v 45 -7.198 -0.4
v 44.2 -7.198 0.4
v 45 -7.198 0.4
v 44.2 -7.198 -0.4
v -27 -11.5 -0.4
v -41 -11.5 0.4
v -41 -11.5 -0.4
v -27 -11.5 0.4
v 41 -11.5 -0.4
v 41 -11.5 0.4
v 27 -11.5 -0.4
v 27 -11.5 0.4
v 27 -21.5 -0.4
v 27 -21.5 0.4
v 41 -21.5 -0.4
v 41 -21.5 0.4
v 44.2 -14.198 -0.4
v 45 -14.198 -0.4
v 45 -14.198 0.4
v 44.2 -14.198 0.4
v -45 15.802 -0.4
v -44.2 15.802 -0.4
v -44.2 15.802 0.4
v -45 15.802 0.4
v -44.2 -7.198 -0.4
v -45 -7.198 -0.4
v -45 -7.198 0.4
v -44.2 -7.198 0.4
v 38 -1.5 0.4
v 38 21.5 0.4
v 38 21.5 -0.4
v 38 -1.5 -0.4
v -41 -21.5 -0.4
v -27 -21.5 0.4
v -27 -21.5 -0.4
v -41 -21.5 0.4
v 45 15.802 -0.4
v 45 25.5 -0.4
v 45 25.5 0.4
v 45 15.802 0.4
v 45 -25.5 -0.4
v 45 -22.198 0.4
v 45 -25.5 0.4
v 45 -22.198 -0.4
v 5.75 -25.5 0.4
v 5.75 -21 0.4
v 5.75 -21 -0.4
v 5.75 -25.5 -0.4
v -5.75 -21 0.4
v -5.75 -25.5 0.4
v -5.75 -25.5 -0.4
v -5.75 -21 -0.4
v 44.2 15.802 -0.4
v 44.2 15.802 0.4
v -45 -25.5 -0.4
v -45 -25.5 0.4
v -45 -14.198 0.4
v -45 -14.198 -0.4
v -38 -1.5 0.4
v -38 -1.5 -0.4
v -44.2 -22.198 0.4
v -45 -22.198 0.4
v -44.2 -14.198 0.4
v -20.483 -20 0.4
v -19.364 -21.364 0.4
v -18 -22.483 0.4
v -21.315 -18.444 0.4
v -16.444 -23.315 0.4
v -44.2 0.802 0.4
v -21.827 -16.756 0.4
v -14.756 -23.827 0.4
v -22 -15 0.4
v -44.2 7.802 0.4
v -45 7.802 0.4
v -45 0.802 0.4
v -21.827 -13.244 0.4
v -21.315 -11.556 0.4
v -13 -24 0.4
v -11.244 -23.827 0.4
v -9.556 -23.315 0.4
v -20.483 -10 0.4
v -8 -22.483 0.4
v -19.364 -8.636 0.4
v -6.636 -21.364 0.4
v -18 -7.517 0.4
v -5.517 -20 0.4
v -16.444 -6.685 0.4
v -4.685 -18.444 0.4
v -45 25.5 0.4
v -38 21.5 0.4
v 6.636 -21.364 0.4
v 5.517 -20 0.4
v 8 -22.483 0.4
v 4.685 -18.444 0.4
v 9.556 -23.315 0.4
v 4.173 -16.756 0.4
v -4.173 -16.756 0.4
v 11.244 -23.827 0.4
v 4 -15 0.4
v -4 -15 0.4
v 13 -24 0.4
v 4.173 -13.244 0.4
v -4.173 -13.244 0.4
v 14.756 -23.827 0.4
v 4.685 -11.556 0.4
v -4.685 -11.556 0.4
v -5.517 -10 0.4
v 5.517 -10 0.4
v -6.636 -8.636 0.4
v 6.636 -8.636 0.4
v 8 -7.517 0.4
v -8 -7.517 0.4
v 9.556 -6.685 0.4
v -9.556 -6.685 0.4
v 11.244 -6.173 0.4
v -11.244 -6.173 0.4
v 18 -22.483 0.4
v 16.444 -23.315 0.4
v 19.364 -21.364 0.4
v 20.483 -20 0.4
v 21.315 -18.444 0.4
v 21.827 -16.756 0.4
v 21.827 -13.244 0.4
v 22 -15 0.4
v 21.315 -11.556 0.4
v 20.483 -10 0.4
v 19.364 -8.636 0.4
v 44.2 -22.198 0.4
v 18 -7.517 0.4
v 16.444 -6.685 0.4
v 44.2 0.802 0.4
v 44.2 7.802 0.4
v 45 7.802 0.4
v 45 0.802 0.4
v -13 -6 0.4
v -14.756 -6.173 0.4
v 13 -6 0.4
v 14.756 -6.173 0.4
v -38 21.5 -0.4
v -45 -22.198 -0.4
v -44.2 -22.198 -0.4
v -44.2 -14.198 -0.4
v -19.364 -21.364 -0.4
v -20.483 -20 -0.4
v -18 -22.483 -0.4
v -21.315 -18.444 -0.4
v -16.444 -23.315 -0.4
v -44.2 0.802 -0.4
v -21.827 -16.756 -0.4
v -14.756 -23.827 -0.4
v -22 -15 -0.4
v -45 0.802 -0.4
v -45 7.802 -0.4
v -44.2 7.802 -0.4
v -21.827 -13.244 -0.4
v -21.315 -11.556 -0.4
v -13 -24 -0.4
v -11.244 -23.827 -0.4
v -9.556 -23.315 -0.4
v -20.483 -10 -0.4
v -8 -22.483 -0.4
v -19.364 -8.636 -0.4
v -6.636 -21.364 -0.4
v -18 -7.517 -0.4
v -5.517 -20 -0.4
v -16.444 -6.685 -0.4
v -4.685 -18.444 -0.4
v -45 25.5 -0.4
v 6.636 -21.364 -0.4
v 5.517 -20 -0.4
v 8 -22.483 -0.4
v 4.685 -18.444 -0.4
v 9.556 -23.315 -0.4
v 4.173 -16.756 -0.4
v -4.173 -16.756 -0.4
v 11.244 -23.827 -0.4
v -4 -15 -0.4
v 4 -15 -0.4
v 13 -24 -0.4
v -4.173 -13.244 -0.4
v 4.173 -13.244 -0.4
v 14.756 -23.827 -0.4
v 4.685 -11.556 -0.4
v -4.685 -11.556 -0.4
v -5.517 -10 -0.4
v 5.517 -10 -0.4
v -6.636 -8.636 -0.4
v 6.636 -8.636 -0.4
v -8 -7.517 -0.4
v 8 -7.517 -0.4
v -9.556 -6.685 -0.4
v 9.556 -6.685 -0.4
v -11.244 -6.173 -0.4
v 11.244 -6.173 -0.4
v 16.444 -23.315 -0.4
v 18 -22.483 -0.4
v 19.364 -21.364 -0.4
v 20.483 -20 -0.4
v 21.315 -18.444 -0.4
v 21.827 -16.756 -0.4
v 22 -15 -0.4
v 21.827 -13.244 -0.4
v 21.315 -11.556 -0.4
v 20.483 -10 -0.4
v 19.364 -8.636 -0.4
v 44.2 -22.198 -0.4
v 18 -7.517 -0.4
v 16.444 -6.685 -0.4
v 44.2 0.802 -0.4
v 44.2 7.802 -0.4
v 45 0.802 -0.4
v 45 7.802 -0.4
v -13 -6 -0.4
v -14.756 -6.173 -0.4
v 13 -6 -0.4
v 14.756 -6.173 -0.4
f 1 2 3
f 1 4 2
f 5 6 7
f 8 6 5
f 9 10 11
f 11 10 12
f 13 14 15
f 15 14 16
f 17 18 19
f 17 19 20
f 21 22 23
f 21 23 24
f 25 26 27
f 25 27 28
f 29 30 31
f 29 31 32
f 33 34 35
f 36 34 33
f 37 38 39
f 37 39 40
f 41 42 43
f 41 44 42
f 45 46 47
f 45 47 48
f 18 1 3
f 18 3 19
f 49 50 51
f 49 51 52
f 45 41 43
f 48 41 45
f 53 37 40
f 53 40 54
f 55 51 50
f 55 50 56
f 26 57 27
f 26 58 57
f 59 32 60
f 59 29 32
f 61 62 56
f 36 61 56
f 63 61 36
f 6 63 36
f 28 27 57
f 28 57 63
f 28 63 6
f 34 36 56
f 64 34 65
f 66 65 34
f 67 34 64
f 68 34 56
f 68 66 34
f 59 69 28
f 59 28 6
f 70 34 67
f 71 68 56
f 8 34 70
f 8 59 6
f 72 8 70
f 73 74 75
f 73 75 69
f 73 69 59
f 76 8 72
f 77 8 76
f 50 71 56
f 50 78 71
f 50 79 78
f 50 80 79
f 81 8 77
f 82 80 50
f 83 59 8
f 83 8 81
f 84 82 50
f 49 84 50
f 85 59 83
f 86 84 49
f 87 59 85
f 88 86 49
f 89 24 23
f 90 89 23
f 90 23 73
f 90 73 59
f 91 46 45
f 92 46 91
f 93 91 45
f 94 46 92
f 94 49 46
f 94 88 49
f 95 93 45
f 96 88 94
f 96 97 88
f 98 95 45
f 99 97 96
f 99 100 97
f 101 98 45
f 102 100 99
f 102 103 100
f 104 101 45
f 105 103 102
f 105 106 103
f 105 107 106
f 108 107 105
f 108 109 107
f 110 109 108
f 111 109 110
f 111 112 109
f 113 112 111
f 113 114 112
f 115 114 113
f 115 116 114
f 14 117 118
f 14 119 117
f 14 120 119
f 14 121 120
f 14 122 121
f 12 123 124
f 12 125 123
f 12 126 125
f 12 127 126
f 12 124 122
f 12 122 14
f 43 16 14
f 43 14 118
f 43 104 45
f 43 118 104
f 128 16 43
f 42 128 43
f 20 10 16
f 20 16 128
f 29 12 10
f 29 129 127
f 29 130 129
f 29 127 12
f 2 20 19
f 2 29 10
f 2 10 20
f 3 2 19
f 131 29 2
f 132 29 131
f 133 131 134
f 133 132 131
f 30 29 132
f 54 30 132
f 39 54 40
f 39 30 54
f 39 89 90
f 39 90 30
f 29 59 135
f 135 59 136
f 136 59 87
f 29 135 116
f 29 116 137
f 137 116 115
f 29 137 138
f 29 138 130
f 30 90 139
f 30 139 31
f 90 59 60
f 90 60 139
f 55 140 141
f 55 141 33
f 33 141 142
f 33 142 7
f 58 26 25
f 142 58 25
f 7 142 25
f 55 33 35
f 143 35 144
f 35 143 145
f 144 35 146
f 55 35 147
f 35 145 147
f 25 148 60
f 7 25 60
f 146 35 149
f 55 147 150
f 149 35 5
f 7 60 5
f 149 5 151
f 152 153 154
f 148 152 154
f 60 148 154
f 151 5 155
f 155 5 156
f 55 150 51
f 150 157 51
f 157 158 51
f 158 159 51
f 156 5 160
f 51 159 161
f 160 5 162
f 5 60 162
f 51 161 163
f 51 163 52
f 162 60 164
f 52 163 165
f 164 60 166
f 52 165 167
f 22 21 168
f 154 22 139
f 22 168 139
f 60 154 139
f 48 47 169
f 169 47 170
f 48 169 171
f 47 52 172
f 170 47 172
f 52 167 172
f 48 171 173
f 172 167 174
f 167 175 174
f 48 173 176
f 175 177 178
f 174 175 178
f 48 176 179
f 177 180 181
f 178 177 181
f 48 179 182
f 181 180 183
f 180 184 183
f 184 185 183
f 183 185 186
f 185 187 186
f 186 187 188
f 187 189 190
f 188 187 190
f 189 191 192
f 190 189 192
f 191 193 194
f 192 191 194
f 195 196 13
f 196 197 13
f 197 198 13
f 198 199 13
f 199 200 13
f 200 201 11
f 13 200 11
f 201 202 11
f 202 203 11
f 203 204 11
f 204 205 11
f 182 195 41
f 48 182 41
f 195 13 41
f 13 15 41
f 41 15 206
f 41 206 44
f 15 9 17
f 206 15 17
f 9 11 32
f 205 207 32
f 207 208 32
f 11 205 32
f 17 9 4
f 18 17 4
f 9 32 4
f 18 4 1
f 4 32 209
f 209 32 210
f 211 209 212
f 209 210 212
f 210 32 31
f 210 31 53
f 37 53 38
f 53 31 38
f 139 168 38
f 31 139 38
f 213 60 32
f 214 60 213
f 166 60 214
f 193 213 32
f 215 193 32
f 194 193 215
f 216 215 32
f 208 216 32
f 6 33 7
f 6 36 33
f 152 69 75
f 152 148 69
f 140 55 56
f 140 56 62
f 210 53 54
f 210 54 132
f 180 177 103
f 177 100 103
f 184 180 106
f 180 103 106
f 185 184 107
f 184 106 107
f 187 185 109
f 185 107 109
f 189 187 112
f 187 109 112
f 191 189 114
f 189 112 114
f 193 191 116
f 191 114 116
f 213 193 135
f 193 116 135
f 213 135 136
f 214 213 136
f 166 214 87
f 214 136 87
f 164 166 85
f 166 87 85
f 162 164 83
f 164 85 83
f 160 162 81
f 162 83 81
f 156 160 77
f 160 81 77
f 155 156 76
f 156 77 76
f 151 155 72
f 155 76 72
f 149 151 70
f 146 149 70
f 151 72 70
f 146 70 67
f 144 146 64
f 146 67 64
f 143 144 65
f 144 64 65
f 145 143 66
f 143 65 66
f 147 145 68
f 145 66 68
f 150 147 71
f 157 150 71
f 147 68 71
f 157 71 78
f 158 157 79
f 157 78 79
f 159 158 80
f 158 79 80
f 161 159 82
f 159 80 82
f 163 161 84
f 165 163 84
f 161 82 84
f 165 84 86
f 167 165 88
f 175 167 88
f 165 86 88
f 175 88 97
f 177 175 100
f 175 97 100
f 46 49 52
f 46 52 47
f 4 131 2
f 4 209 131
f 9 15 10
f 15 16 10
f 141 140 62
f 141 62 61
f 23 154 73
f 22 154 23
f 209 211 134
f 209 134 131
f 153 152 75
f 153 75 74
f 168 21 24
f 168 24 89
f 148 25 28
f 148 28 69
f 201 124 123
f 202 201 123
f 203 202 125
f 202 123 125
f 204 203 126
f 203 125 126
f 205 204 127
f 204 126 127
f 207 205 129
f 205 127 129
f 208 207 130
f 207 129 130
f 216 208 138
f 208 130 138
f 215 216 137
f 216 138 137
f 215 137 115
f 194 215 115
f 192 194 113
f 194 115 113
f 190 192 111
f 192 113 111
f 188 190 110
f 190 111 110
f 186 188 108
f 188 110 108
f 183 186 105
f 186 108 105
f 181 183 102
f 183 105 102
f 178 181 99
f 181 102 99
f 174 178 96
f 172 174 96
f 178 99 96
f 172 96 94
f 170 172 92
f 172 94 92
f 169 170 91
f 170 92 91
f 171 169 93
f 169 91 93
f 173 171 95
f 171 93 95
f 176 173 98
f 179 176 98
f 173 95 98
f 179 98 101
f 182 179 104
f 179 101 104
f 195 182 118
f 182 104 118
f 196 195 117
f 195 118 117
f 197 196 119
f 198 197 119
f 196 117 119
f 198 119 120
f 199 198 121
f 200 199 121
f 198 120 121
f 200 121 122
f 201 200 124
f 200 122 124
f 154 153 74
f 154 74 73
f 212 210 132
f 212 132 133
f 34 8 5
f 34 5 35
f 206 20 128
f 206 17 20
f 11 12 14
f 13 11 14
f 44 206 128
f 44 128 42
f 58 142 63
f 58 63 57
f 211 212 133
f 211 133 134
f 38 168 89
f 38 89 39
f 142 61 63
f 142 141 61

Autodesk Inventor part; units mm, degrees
ref_plane "YZ Plane" through (0, 0, 0) normal (1, 0, 0) x (0, 1, 0)
ref_plane "XZ Plane" through (0, 0, 0) normal (0, 1, 0) x (-1, 0, 0)
ref_plane "XY Plane" through (0, 0, 0) normal (0, 0, 1) x (1, 0, 0)
sketch "Sketch1" plane through (0, 0, 0) normal (0, 0, 1) x (1, 0, 0)
  line L0 (0, 35.7) -> (0, -35.7) construction
  line L1 (-63, 0) -> (63, 0) construction
  line L2 (45, -25.5) -> (-45, -25.5)
  line L3 (-45, -25.5) -> (-45, 25.5)
  line L4 (-45, 25.5) -> (45, 25.5)
  line L5 (45, 25.5) -> (45, -25.5)
  line L6 (45, -25.5) -> (-45, 25.5) construction
  line L7 (-45, -25.5) -> (45, 25.5) construction
  point P0 (0, 0)
  dimension "d0" = 90
  dimension "d1" = 51
extrude "Extrusion1" add sketch "Sketch1" along normal mid plane 0.8
sketch "Esquisse2" plane through (0, 0, 0.4) normal (0, 0, 1) x (1, 0, 0)
  line L0 (-45, -25.5) -> (45, -25.5) construction
  line L1 (45, -25.5) -> (45, 25.5) construction
  line L2 (45, 25.5) -> (-45, 25.5) construction
  line L3 (-45, 25.5) -> (-45, -25.5) construction
  line L4 (-63, 0) -> (63, 0) construction
  line L5 (0, 35.7) -> (0, -35.7) construction
  circle A0 centre (-13, -15) radius 9
  circle A1 centre (13, -15) radius 9
  point P0 (0, 0)
  dimension "d4" = 10.5
  dimension "d5" = 18
  dimension "d6" = 18
  dimension "d7" = 26
extrude "Extrusion2" cut sketch "Esquisse2" against normal through all
sketch "Esquisse3" plane through (0, 0, 0.4) normal (0, 0, 1) x (1, 0, 0)
  circle A0 centre (-13, -15) radius 9 construction
  circle A1 centre (13, -15) radius 9 construction
  line L0 (-45, -25.5) -> (45, -25.5) construction
  line L1 (45, -25.5) -> (45, 25.5) construction
  line L2 (45, 25.5) -> (-45, 25.5) construction
  line L3 (-45, 25.5) -> (-45, -25.5) construction
  line L4 (-63, 0) -> (63, 0) construction
  line L5 (0, 35.7) -> (0, -35.7) construction
  line L6 (-5.75, -21) -> (5.75, -21)
  line L7 (5.75, -21) -> (5.75, -25.5)
  line L8 (5.75, -25.5) -> (-5.75, -25.5)
  line L9 (-5.75, -25.5) -> (-5.75, -21)
  point P0 (0, 0)
  dimension "d10" = 4.5
  dimension "d11" = 11.5
extrude "Extrusion3" cut sketch "Esquisse3" against normal through all
sketch "Esquisse4" plane through (0, 0, 0.4) normal (0, 0, 1) x (1, 0, 0)
  line L0 (5.75, -21) -> (5.75, -25.5) construction
  line L1 (5.75, -25.5) -> (45, -25.5) construction
  line L2 (45, -25.5) -> (45, 25.5) construction
  line L3 (45, 25.5) -> (-45, 25.5) construction
  line L4 (-45, 25.5) -> (-45, -25.5) construction
  line L5 (-45, -25.5) -> (-5.75, -25.5) construction
  line L6 (-5.75, -25.5) -> (-5.75, -21) construction
  line L7 (-5.75, -21) -> (5.75, -21) construction
  circle A0 centre (-13, -15) radius 9 construction
  circle A1 centre (13, -15) radius 9 construction
  line L8 (0, 35.7) -> (0, -35.7) construction
  line L9 (-63, 0) -> (63, 0) construction
  line L10 (-38, 21.5) -> (38, 21.5)
  line L11 (38, 21.5) -> (38, -1.5)
  line L12 (38, -1.5) -> (-38, -1.5)
  line L13 (-38, -1.5) -> (-38, 21.5)
  point P0 (0, 0)
  dimension "d14" = 76
  dimension "d15" = 23
  dimension "d16" = 4
extrude "Extrusion4" cut sketch "Esquisse4" against normal blind 10
sketch "Esquisse5" plane through (0, 0, 0.4) normal (0, 0, 1) x (1, 0, 0)
  line L0 (-38, -1.5) -> (-38, 21.5) construction
  line L1 (-38, 21.5) -> (38, 21.5) construction
  line L2 (38, 21.5) -> (38, -1.5) construction
  line L3 (38, -1.5) -> (-38, -1.5) construction
  line L4 (5.75, -21) -> (5.75, -25.5) construction
  line L5 (5.75, -25.5) -> (45, -25.5) construction
  line L6 (45, -25.5) -> (45, 25.5) construction
  line L7 (45, 25.5) -> (-45, 25.5) construction
  line L8 (-45, 25.5) -> (-45, -25.5) construction
  line L9 (-45, -25.5) -> (-5.75, -25.5) construction
  line L10 (-5.75, -25.5) -> (-5.75, -21) construction
  line L11 (-5.75, -21) -> (5.75, -21) construction
  circle A0 centre (-13, -15) radius 9 construction
  circle A1 centre (13, -15) radius 9 construction
  line L12 (-41, -11.5) -> (-27, -11.5)
  line L13 (-27, -11.5) -> (-27, -21.5)
  line L14 (-27, -21.5) -> (-41, -21.5)
  line L15 (-41, -21.5) -> (-41, -11.5)
  line L16 (0, 35.7) -> (0, -35.7) construction
  line L17 (41, -11.5) -> (27, -11.5)
  line L18 (27, -11.5) -> (27, -21.5)
  line L19 (27, -21.5) -> (41, -21.5)
  line L20 (41, -21.5) -> (41, -11.5)
  point P0 (0, 0)
  dimension "d19" = 14
  dimension "d20" = 10
  dimension "d21" = 4
  dimension "d22" = 4
extrude "Extrusion5" cut sketch "Esquisse5" against normal blind 10
sketch "Esquisse7" plane through (0, 0, -0.4) normal (0, 0, -1) x (-1, 0, 0)
  line L0 (44.2, 0.8021) -> (45, 0.8021)
  line L1 (45, 0.8021) -> (45, -7.1979)
  line L2 (45, -7.1979) -> (44.2, -7.1979)
  line L3 (44.2, -7.1979) -> (44.2, 0.8021)
  line L4 (44.2, 15.8021) -> (45, 15.8021)
  line L5 (45, 15.8021) -> (45, 7.8021)
  line L6 (45, 7.8021) -> (44.2, 7.8021)
  line L7 (44.2, 7.8021) -> (44.2, 15.8021)
  line L8 (44.2, -14.1979) -> (45, -14.1979)
  line L9 (45, -14.1979) -> (45, -22.1979)
  line L10 (45, -22.1979) -> (44.2, -22.1979)
  line L11 (44.2, -22.1979) -> (44.2, -14.1979)
  line L12 (-45, 0.8021) -> (-44.2, 0.8021)
  line L13 (-44.2, 0.8021) -> (-44.2, -7.1979)
  line L14 (-44.2, -7.1979) -> (-45, -7.1979)
  line L15 (-45, -7.1979) -> (-45, 0.8021)
  line L16 (-45, 15.8021) -> (-44.2, 15.8021)
  line L17 (-44.2, 15.8021) -> (-44.2, 7.8021)
  line L18 (-44.2, 7.8021) -> (-45, 7.8021)
  line L19 (-45, 7.8021) -> (-45, 15.8021)
  line L20 (-45, -14.1979) -> (-44.2, -14.1979)
  line L21 (-44.2, -14.1979) -> (-44.2, -22.1979)
  line L22 (-44.2, -22.1979) -> (-45, -22.1979)
  line L23 (-45, -22.1979) -> (-45, -14.1979)
  point P0 (0, 0)
extrude "Extrusion7" cut sketch "Esquisse7" against normal blind 0.8
properties part number "Carosserie_Capot_Avant_Bas" material "PVC-U"
